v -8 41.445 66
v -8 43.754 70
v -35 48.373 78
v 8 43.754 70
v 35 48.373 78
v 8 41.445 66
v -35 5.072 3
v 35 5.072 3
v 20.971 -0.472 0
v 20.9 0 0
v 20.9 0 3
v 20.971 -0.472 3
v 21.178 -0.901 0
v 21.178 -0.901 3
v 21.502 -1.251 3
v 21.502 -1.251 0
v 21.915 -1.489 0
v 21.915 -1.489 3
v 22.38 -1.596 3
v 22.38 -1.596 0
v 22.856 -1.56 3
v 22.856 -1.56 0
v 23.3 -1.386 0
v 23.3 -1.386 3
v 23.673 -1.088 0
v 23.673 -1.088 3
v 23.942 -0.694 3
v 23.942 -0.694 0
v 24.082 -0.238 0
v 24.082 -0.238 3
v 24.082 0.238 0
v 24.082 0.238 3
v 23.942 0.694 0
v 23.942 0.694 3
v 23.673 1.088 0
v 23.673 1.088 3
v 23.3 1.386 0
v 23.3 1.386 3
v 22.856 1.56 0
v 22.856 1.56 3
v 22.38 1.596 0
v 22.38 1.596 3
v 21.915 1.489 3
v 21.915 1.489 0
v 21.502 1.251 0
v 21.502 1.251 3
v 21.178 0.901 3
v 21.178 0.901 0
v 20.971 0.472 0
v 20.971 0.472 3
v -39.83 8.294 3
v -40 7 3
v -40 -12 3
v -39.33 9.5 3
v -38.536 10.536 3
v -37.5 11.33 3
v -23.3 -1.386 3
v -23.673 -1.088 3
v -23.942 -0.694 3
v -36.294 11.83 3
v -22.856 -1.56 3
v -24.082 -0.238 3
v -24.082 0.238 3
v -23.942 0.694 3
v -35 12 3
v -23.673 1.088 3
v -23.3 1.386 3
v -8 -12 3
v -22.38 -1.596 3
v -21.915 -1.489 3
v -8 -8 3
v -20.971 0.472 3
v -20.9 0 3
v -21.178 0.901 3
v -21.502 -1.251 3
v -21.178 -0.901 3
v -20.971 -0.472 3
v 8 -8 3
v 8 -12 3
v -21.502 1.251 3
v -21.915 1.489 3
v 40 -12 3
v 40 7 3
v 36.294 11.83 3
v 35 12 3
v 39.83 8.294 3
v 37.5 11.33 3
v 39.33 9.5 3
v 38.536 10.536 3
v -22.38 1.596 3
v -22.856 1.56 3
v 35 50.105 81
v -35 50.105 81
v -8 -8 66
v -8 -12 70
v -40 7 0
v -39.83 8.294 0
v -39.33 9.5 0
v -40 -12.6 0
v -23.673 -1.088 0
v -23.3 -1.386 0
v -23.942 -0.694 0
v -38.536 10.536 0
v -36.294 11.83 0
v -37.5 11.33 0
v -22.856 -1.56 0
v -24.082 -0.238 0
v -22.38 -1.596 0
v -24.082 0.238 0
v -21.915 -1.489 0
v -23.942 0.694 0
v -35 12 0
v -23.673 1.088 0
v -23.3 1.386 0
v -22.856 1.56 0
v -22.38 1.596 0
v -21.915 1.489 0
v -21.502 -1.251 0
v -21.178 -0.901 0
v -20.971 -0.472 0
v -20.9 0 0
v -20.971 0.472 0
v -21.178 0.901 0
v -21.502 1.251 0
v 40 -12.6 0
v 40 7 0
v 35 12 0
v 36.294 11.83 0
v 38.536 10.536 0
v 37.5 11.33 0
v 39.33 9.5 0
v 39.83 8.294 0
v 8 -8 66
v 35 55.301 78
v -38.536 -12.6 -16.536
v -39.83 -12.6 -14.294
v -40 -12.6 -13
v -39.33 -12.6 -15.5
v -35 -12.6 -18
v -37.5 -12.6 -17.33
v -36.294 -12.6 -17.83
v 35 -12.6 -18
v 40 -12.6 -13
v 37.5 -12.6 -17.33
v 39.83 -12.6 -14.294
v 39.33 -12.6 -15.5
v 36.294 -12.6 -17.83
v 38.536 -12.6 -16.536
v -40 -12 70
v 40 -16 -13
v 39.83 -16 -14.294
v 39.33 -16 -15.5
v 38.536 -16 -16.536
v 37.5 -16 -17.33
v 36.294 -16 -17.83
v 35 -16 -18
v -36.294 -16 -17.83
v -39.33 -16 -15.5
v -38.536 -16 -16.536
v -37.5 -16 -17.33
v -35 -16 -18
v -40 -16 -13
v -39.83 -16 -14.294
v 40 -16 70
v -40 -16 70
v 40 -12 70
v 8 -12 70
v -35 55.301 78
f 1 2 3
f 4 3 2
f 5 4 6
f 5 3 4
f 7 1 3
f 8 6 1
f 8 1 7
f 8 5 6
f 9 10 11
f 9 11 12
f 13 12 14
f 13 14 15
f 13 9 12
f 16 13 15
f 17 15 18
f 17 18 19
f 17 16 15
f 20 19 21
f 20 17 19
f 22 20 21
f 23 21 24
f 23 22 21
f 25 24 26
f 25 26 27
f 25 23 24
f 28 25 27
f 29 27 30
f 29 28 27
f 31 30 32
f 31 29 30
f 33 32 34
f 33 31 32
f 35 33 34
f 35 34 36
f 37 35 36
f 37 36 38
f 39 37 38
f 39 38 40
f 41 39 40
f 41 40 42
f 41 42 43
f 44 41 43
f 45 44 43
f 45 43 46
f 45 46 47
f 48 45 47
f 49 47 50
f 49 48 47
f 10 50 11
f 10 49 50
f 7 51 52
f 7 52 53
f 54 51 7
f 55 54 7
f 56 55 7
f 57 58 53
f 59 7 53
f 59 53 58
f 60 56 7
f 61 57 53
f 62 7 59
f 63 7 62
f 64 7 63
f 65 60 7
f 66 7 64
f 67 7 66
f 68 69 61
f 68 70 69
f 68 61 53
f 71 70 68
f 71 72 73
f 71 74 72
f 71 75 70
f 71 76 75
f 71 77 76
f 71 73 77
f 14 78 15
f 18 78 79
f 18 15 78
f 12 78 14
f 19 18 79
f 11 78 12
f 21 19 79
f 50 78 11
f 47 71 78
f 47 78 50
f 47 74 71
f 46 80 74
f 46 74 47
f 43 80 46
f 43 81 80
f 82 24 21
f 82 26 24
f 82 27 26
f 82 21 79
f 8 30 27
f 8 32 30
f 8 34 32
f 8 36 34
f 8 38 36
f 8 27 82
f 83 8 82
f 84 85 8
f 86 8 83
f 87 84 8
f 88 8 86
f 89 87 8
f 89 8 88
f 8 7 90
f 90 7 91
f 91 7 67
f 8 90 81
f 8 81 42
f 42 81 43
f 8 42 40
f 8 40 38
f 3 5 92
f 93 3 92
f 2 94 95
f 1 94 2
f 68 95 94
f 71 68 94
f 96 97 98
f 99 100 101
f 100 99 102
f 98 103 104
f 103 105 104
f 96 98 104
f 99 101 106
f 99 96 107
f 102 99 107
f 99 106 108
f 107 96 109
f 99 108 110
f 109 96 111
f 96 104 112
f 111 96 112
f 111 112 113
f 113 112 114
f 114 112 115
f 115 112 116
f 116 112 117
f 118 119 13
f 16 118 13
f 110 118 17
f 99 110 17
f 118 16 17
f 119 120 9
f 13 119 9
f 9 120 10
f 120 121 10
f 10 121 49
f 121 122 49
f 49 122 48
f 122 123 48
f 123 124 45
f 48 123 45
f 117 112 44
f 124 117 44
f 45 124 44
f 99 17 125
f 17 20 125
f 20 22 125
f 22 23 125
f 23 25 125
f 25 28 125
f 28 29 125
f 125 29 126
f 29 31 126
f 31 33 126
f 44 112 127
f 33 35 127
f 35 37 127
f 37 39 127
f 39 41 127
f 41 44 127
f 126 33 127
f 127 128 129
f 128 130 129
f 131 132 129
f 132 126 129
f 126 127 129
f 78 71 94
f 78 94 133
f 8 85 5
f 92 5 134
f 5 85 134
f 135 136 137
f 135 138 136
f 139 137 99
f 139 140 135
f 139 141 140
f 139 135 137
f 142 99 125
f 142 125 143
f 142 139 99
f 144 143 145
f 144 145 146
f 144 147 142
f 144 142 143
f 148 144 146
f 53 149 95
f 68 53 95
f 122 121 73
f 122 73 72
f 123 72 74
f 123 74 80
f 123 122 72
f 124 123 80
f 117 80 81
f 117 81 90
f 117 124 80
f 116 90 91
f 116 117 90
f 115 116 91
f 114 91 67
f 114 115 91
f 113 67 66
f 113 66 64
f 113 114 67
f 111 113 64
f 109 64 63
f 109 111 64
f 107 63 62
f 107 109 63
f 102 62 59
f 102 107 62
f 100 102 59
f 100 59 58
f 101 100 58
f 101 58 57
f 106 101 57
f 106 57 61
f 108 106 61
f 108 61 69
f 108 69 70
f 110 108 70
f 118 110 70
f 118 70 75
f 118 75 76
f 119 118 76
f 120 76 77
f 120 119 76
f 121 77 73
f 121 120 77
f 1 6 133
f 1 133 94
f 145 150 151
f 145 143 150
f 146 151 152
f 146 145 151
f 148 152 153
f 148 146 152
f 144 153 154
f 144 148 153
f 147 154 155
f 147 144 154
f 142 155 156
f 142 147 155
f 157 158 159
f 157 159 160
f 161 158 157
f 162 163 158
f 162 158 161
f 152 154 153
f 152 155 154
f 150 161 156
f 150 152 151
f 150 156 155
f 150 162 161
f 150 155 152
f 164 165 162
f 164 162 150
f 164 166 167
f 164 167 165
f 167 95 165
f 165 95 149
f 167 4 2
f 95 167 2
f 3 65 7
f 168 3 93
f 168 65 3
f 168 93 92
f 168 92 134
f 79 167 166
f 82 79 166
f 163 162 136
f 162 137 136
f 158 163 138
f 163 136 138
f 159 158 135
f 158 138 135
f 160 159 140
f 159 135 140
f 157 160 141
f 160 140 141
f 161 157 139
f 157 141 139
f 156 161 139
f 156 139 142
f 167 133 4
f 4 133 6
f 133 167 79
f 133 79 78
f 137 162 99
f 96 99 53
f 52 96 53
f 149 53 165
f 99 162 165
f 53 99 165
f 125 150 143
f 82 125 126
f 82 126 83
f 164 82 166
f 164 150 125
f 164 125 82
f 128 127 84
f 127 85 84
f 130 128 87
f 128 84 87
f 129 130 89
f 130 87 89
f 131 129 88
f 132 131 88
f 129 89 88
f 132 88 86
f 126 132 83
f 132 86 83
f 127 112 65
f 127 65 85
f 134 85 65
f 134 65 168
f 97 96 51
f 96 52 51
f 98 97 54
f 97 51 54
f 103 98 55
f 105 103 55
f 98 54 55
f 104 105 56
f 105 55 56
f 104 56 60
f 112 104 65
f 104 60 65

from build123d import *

# Parameters (mm, degrees)
SKETCH_1_W           = 80
SKETCH_1_H           = 24
SKETCH_1_R           = 1.6
EXTRUDE_1_DEPTH      = 3
SKETCH_2_W           = 80
SKETCH_2_H           = 70
EXTRUDE_2_DEPTH      = 4
SKETCH_3_W           = 80
SKETCH_3_H           = 18
EXTRUDE_3_DEPTH      = 4
SKETCH_4_W           = 80
SKETCH_4_H           = 18
CUT_EXTRUDE_1_DEPTH  = 0.6
FILLET_1_R           = 5
FILLET_2_R           = 5
SKETCH_5_W           = 16
SKETCH_5_H           = 67
EXTRUDE_4_DEPTH      = 4
SKETCH_6_W           = 16
SKETCH_6_H           = 40
EXTRUDE_5_DEPTH      = 4
EXTRUDE_6_DEPTH      = 35
EXTRUDE_6_DEPTH_BACK = 35
SKETCH_9_W           = 16
SKETCH_9_H           = 15
EXTRUDE_7_DEPTH      = 4
EXTRUDE_9_DEPTH      = 70


with BuildPart() as part:
    # 草图1 → 凸台-拉伸1 (new body)
    with BuildSketch(Plane.XY):
        Rectangle(SKETCH_1_W, SKETCH_1_H)
        with Locations((-22.5, 0)):
            Circle(SKETCH_1_R, mode=Mode.SUBTRACT)
        with Locations(Location((22.5, 0, 0), (0, 0, 180))):
            Circle(SKETCH_1_R, mode=Mode.SUBTRACT)
    extrude(amount=EXTRUDE_1_DEPTH)

    # 草图2 → 凸台-拉伸2 (add)
    with BuildSketch(Plane.XZ.offset(12)):
        with Locations((0, 35)):
            Rectangle(SKETCH_2_W, SKETCH_2_H)
    extrude(amount=EXTRUDE_2_DEPTH)

    # 草图3 → 凸台-拉伸3 (add)
    with BuildSketch(Plane.XZ.offset(16)):
        with Locations((0, -9)):
            Rectangle(SKETCH_3_W, SKETCH_3_H)
    extrude(amount=-EXTRUDE_3_DEPTH)

    # 草图4 → 切除-拉伸1 (cut)
    with BuildSketch(Plane(origin=(0, -12, 0), x_dir=(1, 0, 0), z_dir=(0, 1, 0))):
        with Locations((0, 9)):
            Rectangle(SKETCH_4_W, SKETCH_4_H)
    extrude(amount=-CUT_EXTRUDE_1_DEPTH, mode=Mode.SUBTRACT)

    # 圆角1
    fillet_1_edges = [part.edges().sort_by_distance(p)[0] for p in [
        (-40, -14.3, -18),
        (40, -14.3, -18),
    ]]
    fillet(fillet_1_edges, radius=FILLET_1_R)

    # 圆角2
    fillet_2_edges = [part.edges().sort_by_distance(p)[0] for p in [
        (-40, 12, 1.5),
        (40, 12, 1.5),
    ]]
    fillet(fillet_2_edges, radius=FILLET_2_R)

    # 草图5 → 凸台-拉伸4 (add)
    with BuildSketch(Plane(origin=(0, -12, 0), x_dir=(1, 0, 0), z_dir=(0, 1, 0))):
        with Locations((0, -36.5)):
            Rectangle(SKETCH_5_W, SKETCH_5_H)
    extrude(amount=EXTRUDE_4_DEPTH)

    # 草图6 → 凸台-拉伸5 (add)
    with BuildSketch(Plane.XY.offset(70)):
        with Locations((0, 12)):
            Rectangle(SKETCH_6_W, SKETCH_6_H)
    extrude(amount=-EXTRUDE_5_DEPTH)

    # 草图8 → 凸台-拉伸6 (add, two sides: drawn at the far end of the back side and taken through both)
    with BuildSketch(Plane.ZY.offset(-EXTRUDE_6_DEPTH_BACK)):
        Polygon((3, 12), (78, 55.301270189), (78, 48.373066959), (3, 5.07179677), align=None)
    extrude(amount=EXTRUDE_6_DEPTH + EXTRUDE_6_DEPTH_BACK)

    # 草图9 → 凸台-拉伸7 (add)
    with BuildSketch(Plane(origin=(0, 0, 66), x_dir=(-1, 0, 0), z_dir=(0, 0, -1))):
        with Locations((0, 39.5)):
            Rectangle(SKETCH_9_W, SKETCH_9_H)
    extrude(amount=-EXTRUDE_7_DEPTH)

    # 草图11 → 凸台-拉伸9 (add)
    with BuildSketch(Plane(origin=(35, 0, 0), x_dir=(0, 0, -1), z_dir=(1, 0, 0))):
        Polygon((-78, 48.373066959), (-81, 50.105117767), (-78, 55.301270189), align=None)
    extrude(amount=-EXTRUDE_9_DEPTH)


solid = part.part
